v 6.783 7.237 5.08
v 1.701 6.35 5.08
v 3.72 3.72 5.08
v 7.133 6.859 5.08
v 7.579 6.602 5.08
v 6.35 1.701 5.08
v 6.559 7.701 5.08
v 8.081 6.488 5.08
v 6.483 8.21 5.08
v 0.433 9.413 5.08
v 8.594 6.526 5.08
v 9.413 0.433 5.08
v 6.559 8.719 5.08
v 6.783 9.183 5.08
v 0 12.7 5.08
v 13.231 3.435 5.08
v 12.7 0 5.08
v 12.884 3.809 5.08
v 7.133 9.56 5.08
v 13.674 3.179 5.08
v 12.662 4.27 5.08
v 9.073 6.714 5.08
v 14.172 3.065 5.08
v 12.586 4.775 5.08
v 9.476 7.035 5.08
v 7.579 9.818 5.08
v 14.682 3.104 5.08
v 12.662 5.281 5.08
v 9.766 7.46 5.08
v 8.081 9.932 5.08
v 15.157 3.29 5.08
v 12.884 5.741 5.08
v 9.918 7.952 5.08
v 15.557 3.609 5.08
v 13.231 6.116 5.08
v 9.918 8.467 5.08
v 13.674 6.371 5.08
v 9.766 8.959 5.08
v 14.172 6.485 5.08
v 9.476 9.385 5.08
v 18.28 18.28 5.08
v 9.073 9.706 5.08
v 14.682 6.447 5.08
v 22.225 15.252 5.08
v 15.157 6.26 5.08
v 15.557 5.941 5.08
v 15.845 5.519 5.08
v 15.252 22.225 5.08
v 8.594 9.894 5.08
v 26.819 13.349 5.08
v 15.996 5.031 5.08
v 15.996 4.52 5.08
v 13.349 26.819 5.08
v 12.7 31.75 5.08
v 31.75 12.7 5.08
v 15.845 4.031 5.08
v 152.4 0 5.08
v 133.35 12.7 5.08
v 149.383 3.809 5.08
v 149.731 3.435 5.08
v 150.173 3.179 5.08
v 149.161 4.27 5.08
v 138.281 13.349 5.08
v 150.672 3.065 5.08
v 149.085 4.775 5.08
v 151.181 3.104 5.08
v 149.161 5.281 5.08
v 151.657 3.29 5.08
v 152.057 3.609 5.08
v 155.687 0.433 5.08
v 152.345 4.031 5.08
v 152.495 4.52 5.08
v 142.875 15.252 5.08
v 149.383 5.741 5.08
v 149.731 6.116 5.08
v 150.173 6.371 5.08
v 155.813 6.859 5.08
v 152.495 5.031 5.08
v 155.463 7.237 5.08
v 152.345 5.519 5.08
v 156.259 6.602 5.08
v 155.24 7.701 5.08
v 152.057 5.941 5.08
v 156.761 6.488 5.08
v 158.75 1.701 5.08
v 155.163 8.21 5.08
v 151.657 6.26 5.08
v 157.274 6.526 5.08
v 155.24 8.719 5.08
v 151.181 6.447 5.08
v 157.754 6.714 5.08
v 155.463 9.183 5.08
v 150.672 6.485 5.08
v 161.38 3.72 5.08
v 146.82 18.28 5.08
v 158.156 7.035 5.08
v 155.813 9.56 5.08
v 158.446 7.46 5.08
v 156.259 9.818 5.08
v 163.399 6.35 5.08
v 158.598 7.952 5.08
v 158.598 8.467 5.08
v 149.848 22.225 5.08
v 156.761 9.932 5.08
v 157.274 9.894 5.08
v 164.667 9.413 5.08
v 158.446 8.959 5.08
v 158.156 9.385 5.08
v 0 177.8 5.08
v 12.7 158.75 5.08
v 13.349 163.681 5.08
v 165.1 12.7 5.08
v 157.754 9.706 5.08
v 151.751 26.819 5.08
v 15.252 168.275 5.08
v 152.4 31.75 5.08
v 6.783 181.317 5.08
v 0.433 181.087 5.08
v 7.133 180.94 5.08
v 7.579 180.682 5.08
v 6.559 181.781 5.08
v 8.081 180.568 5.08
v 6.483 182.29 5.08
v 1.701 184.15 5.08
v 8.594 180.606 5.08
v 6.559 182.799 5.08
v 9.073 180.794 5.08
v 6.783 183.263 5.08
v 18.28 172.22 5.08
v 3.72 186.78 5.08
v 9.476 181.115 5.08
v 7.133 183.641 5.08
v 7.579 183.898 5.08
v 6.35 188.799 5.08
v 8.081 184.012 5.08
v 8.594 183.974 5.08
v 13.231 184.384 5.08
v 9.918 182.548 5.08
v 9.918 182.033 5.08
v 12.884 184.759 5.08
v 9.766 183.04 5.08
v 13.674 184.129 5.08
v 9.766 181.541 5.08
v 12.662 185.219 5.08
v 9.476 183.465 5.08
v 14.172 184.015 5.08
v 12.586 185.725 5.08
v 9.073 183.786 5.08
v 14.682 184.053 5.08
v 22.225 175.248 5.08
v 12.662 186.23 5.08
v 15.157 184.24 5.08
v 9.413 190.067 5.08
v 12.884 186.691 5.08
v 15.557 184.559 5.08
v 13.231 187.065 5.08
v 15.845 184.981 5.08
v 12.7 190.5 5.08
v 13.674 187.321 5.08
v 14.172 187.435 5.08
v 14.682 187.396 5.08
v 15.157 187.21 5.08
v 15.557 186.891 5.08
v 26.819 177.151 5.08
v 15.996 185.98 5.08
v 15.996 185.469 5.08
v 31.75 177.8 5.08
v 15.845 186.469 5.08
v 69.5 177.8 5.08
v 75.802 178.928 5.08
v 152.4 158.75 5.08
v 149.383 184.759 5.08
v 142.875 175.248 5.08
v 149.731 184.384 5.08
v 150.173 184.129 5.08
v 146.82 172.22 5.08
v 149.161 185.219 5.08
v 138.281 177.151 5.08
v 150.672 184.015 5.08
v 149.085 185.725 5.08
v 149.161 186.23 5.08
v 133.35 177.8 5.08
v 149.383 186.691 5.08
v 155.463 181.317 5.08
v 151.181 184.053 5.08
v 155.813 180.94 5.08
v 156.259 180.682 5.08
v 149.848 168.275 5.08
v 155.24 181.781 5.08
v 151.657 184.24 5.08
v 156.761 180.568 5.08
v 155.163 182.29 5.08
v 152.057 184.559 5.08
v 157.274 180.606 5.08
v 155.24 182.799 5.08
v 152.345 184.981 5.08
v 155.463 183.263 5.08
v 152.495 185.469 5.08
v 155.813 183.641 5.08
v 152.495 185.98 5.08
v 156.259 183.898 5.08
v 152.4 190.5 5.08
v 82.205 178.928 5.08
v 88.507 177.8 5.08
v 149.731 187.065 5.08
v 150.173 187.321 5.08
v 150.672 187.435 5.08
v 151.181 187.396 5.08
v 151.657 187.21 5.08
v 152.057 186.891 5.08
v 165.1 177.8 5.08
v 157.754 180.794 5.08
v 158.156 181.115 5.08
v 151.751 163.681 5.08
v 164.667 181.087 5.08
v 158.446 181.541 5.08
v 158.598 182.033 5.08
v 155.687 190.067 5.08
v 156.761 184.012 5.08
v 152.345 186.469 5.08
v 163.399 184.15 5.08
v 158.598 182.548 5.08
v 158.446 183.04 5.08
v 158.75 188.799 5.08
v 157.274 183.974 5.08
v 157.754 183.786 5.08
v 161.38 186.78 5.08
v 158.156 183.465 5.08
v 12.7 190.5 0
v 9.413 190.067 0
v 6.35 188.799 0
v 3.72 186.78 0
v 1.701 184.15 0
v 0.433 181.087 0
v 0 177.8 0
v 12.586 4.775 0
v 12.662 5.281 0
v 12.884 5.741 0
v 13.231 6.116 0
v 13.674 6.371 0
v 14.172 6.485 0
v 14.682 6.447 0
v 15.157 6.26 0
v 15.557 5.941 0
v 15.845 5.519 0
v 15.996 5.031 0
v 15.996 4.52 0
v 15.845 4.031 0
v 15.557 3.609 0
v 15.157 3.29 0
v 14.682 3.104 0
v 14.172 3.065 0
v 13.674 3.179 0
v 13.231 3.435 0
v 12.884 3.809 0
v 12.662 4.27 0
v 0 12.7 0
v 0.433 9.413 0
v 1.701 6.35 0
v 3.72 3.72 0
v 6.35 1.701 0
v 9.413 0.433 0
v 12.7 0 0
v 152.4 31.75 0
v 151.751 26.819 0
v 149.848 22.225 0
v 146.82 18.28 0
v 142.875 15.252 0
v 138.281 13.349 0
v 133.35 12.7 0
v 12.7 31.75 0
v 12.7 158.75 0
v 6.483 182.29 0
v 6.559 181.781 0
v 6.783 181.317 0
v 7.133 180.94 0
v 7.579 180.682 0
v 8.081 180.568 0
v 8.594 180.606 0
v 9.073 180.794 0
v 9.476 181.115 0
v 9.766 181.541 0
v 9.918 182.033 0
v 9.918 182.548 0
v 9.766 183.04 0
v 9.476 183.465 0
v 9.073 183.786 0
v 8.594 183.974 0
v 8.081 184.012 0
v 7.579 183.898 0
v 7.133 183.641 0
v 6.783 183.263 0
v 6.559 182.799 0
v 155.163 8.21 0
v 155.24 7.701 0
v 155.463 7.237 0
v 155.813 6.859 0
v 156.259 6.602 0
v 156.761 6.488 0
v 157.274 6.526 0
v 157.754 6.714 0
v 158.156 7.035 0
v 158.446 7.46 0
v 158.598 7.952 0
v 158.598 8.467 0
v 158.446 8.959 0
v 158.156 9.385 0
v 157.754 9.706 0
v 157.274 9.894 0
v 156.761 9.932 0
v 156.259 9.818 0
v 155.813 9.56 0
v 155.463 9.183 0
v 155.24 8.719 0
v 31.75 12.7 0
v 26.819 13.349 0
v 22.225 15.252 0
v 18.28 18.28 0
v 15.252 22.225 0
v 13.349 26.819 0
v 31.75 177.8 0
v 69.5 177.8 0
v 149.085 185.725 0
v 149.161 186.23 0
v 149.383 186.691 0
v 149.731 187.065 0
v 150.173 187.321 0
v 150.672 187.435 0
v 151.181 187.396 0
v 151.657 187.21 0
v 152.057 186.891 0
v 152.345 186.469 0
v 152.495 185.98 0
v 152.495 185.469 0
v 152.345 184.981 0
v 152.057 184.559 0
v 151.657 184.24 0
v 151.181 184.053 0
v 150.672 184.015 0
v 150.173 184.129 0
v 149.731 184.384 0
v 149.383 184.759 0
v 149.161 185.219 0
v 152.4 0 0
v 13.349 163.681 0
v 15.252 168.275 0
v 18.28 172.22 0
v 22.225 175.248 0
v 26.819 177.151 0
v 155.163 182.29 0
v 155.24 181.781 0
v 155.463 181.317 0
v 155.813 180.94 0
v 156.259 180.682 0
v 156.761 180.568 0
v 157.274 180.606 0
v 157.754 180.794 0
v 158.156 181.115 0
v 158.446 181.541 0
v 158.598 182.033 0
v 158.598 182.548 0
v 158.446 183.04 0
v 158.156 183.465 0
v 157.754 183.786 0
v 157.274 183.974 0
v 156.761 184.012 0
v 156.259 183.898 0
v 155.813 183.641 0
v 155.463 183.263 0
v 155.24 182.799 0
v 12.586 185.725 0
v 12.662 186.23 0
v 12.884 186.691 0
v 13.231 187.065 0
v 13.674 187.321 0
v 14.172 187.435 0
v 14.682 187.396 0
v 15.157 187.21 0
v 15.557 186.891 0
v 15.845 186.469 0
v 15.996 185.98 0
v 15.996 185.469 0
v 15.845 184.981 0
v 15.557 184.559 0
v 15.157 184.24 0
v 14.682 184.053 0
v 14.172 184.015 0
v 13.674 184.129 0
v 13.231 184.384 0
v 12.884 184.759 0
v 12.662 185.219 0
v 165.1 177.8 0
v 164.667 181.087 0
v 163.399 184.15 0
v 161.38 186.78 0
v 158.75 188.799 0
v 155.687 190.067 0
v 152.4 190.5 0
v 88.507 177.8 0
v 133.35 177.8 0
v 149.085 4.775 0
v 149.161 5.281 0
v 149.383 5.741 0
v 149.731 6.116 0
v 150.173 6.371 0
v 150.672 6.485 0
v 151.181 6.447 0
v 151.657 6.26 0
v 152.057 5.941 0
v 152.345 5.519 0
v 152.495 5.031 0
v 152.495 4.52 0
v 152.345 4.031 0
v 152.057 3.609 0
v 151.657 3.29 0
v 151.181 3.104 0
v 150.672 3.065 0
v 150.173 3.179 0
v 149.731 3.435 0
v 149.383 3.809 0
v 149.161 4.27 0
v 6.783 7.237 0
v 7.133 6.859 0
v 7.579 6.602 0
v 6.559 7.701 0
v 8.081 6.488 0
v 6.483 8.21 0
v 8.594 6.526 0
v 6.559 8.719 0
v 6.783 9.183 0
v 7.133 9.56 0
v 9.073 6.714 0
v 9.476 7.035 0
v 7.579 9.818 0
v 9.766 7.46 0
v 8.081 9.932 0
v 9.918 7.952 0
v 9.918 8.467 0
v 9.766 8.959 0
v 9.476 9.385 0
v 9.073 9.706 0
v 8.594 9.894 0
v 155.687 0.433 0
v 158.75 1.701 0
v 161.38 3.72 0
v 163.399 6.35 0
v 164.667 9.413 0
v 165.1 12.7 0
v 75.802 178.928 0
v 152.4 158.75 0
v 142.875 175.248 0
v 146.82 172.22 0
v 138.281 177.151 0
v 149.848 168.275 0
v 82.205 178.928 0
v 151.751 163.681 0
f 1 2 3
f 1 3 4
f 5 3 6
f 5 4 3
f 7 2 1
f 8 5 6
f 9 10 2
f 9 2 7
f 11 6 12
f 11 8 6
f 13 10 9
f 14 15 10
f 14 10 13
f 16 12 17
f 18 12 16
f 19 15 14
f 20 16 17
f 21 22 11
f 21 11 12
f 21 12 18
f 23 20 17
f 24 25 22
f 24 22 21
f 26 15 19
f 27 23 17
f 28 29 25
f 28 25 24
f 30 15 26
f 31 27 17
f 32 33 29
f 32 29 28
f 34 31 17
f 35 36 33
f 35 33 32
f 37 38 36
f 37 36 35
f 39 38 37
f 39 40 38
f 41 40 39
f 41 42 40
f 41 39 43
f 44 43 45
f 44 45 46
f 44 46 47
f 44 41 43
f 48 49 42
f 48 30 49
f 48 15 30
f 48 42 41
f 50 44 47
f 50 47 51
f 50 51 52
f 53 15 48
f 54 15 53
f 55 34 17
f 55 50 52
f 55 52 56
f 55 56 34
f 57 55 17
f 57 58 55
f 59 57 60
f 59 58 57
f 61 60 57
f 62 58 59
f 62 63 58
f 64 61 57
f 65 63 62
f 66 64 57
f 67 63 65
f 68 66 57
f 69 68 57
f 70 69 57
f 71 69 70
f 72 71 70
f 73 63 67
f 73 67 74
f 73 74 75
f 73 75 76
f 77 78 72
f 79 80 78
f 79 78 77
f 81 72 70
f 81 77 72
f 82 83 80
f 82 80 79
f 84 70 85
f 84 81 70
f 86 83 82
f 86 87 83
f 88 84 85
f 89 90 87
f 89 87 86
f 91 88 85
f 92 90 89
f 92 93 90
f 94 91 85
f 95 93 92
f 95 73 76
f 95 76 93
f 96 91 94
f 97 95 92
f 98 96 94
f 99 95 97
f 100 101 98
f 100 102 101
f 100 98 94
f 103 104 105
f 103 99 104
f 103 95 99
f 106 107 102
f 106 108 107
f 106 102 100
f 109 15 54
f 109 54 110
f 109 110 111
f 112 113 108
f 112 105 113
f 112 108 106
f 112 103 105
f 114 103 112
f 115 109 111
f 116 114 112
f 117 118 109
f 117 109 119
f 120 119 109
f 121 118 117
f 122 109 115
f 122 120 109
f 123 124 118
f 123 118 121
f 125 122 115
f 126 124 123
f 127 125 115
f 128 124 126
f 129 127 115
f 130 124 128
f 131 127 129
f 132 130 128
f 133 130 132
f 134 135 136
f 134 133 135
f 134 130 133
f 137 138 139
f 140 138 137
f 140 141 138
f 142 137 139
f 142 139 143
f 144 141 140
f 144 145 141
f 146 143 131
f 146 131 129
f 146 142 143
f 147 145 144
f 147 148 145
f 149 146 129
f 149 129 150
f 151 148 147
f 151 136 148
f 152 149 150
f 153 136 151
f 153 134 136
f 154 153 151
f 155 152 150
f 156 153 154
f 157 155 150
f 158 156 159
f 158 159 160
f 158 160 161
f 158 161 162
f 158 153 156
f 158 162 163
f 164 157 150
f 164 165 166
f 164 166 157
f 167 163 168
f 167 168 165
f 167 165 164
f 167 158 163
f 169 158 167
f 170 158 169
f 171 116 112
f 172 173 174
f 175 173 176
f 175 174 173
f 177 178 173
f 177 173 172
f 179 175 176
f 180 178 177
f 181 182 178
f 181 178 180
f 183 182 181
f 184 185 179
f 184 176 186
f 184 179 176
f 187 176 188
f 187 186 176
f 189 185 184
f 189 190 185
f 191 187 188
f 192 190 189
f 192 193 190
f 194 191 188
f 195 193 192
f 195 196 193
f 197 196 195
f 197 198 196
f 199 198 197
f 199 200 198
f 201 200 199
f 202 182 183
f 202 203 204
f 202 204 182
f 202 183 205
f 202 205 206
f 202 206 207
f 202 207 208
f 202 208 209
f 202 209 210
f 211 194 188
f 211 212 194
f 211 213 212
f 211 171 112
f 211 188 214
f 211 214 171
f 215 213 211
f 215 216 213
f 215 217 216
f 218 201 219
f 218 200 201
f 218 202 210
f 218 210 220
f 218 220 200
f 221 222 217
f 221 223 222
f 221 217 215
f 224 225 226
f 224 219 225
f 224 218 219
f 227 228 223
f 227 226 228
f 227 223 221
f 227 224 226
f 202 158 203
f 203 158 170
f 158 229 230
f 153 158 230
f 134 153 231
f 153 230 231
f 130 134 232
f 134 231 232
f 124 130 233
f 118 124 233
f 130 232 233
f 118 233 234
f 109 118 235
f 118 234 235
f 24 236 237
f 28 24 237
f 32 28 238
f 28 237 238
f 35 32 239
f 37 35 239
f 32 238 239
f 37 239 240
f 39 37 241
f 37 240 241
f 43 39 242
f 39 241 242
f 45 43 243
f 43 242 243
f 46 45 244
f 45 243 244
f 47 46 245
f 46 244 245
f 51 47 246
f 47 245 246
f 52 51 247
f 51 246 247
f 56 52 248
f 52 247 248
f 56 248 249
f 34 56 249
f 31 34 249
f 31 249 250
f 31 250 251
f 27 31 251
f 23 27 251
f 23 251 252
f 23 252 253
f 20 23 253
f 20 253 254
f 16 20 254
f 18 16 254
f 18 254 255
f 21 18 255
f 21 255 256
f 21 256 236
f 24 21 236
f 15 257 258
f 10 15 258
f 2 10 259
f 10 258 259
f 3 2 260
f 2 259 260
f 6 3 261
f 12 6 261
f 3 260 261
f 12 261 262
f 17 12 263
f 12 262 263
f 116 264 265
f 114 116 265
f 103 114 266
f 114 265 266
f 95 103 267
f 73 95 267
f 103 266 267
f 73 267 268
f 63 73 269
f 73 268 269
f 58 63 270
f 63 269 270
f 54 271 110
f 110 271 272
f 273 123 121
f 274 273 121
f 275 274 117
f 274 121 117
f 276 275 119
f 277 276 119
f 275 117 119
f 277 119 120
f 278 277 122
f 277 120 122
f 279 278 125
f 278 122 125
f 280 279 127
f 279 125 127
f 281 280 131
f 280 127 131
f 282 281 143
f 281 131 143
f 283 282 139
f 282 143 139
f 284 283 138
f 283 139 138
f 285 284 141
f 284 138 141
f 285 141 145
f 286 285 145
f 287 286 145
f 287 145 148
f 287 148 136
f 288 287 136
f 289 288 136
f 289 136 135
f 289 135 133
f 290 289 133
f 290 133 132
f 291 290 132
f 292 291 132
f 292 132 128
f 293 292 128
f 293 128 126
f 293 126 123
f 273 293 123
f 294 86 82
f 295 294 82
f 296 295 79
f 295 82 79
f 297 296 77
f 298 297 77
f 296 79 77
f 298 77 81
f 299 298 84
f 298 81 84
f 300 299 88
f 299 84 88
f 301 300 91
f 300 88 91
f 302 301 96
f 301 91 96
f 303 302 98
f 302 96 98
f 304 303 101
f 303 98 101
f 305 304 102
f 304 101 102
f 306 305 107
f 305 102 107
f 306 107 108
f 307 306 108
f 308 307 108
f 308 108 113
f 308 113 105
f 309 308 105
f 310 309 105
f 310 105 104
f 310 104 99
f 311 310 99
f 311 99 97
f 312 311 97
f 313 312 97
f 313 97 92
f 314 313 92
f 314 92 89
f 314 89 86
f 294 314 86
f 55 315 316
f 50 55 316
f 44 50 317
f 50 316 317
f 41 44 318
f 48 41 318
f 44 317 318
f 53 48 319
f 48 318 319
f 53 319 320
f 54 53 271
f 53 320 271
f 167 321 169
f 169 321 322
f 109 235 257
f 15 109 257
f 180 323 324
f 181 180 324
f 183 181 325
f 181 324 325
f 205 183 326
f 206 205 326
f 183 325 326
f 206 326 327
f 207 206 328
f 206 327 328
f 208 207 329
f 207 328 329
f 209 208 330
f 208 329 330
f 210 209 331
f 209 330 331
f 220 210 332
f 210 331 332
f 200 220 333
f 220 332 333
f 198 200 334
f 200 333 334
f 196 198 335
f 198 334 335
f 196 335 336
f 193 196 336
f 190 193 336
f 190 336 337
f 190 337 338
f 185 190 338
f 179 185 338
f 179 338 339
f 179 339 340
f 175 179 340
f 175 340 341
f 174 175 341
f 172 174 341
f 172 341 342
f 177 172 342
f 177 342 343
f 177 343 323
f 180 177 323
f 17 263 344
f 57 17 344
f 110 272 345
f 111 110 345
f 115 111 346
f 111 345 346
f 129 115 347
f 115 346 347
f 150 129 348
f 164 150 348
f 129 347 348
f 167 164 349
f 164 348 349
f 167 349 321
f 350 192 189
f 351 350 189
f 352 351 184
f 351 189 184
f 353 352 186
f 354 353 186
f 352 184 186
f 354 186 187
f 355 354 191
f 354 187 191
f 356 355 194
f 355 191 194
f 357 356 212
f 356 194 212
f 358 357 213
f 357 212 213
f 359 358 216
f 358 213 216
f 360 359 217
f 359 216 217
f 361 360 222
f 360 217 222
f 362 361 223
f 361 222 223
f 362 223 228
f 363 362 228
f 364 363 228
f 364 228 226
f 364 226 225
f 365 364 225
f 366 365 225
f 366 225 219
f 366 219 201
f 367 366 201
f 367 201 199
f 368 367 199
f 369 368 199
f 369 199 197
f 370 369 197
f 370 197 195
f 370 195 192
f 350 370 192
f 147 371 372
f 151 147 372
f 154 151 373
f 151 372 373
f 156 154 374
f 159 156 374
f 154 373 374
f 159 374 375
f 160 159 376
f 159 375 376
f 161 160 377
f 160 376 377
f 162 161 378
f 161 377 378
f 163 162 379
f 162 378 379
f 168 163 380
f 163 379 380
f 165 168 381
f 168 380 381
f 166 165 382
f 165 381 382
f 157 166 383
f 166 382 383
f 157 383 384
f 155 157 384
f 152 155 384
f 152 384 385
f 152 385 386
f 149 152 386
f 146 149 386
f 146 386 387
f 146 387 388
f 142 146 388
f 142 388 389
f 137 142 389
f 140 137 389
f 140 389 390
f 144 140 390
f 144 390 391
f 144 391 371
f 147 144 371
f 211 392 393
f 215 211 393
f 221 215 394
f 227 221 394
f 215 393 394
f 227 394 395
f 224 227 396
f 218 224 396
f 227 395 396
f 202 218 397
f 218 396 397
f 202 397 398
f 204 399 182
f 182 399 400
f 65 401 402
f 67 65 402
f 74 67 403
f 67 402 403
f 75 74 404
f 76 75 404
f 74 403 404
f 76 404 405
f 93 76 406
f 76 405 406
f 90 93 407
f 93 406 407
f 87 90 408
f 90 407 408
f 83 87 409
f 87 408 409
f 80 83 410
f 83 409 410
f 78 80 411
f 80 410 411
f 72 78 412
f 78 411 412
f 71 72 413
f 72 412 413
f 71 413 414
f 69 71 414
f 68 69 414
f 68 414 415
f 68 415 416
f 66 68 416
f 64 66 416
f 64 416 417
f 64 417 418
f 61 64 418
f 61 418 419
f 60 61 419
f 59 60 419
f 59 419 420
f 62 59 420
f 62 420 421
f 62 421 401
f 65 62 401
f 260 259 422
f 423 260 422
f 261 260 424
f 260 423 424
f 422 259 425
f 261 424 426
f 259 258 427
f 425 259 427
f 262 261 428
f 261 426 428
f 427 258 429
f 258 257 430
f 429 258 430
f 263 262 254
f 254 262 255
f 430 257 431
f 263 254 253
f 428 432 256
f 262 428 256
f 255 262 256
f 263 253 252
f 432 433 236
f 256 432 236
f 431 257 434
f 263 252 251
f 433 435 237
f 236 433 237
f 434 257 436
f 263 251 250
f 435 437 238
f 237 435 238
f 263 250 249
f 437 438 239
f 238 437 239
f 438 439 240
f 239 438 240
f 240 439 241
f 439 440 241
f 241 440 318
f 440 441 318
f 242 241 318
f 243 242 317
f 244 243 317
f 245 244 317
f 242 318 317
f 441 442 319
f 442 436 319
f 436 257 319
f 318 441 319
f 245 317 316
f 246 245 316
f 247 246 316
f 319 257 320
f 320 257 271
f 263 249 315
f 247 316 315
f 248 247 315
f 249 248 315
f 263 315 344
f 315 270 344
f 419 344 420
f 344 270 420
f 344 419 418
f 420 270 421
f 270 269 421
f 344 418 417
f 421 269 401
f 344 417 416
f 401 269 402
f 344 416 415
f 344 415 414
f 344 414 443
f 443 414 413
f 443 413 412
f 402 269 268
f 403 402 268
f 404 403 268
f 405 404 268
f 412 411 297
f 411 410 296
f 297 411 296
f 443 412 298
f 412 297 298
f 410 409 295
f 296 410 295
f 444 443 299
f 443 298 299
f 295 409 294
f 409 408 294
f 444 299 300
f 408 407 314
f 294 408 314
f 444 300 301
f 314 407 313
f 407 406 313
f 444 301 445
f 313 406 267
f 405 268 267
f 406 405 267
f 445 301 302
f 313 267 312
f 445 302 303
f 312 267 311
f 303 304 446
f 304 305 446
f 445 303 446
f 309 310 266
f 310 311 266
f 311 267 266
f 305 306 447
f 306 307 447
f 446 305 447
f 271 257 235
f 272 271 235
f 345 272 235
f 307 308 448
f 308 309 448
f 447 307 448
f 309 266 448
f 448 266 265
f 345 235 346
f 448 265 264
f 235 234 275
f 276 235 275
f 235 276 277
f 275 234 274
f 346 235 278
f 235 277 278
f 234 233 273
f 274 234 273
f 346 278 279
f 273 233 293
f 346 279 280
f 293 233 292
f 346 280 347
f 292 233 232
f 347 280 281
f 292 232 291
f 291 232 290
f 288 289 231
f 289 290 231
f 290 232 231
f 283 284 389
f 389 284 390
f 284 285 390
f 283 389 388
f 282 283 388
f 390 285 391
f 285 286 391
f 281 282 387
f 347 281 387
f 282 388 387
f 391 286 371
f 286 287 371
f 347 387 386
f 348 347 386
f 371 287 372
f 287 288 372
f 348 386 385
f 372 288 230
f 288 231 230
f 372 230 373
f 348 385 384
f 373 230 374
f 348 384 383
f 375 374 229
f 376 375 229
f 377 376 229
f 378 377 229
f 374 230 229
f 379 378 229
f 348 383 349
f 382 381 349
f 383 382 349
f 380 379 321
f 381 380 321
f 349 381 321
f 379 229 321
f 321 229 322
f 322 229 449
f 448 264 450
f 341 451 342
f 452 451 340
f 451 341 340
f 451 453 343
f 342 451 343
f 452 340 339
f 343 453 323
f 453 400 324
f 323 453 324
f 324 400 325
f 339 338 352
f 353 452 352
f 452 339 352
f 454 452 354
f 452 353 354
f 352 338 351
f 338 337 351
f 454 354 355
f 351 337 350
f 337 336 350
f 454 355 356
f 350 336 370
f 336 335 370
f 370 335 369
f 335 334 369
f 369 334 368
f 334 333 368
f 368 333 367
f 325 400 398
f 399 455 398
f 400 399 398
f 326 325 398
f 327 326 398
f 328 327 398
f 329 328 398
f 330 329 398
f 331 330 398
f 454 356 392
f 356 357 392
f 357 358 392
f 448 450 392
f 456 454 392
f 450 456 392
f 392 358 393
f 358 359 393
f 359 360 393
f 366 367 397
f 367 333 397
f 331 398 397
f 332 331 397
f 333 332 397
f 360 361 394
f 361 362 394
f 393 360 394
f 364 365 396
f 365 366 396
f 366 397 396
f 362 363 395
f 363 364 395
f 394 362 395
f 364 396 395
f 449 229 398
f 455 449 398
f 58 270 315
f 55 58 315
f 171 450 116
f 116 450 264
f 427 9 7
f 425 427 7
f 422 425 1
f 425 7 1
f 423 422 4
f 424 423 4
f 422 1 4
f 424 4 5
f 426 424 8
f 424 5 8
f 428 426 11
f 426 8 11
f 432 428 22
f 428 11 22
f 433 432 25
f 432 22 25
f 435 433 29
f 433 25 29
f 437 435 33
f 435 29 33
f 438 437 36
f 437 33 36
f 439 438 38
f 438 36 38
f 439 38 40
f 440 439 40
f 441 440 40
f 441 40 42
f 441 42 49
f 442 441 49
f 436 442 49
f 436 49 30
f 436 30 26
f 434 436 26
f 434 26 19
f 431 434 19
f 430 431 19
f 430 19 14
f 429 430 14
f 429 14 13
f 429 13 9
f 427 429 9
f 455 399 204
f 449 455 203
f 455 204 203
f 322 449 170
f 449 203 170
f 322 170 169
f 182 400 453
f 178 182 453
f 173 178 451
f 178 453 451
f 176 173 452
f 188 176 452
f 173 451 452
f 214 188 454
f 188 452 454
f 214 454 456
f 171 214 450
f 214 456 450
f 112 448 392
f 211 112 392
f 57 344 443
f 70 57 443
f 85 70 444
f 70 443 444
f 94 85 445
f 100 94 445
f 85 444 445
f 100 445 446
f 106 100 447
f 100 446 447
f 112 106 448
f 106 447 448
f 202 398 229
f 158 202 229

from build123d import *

# Parameters (mm, degrees)
F1_DEPTH = 5.08
F3_D     = 3.4544
F5_D     = 3.429
F6_R     = 36.195
F7_DEPTH = 5.081


with BuildPart() as f1:
    # F0 (on Top) → F1 (new body)
    with BuildSketch(Plane.XY):
        with BuildLine():
            ThreePointArc((0, 12.7), (3.7197438789, 3.7197438789), (12.7, 0))
            Line((12.7, 0), (152.4, 0))
            ThreePointArc((152.4, 0), (161.3802561211, 3.7197438789), (165.1, 12.7))
            Line((165.1, 12.7), (165.1, 177.8))
            ThreePointArc((165.1, 177.8), (161.3802561211, 186.7802561211), (152.4, 190.5))
            Line((152.4, 190.5), (12.7, 190.5))
            ThreePointArc((12.7, 190.5), (3.7197438789, 186.7802561211), (0, 177.8))
            Line((0, 177.8), (0, 12.7))
        make_face()
        with BuildLine():
            ThreePointArc((12.7, 158.75), (18.2796158184, 172.2203841816), (31.75, 177.8))
            Line((31.75, 177.8), (133.35, 177.8))
            ThreePointArc((133.35, 177.8), (146.8203841816, 172.2203841816), (152.4, 158.75))
            Line((152.4, 158.75), (152.4, 31.75))
            ThreePointArc((152.4, 31.75), (146.8203841816, 18.2796158184), (133.35, 12.7))
            Line((133.35, 12.7), (31.75, 12.7))
            ThreePointArc((31.75, 12.7), (18.2796158184, 18.2796158184), (12.7, 31.75))
            Line((12.7, 31.75), (12.7, 158.75))
        make_face(mode=Mode.SUBTRACT)
    extrude(amount=F1_DEPTH)

    # F3 (through all)
    with Locations(Plane(origin=(0, 0, 0), x_dir=(1, 0, 0), z_dir=(0, 0, -1))):
        with Locations((8.2098719395, -182.2901280605), (156.8901280605, -182.2901280605), (156.8901280605, -8.2098719395), (8.2098719395, -8.2098719395)):
            Hole(F3_D / 2)

    # F5 (through all)
    with Locations(Plane.XY.offset(5.08)):
        with Locations((14.3002, 185.7248), (150.7998, 185.7248), (14.3002, 4.7752), (150.7998, 4.7752)):
            Hole(F5_D / 2)

    # F6 (on face) → F7 (cut, through all)
    with BuildSketch(Plane.XY.offset(5.08)):
        with Locations((79.0035873652, 142.875)):
            Circle(F6_R)
    extrude(amount=-F7_DEPTH, mode=Mode.SUBTRACT)


solid = f1.part
